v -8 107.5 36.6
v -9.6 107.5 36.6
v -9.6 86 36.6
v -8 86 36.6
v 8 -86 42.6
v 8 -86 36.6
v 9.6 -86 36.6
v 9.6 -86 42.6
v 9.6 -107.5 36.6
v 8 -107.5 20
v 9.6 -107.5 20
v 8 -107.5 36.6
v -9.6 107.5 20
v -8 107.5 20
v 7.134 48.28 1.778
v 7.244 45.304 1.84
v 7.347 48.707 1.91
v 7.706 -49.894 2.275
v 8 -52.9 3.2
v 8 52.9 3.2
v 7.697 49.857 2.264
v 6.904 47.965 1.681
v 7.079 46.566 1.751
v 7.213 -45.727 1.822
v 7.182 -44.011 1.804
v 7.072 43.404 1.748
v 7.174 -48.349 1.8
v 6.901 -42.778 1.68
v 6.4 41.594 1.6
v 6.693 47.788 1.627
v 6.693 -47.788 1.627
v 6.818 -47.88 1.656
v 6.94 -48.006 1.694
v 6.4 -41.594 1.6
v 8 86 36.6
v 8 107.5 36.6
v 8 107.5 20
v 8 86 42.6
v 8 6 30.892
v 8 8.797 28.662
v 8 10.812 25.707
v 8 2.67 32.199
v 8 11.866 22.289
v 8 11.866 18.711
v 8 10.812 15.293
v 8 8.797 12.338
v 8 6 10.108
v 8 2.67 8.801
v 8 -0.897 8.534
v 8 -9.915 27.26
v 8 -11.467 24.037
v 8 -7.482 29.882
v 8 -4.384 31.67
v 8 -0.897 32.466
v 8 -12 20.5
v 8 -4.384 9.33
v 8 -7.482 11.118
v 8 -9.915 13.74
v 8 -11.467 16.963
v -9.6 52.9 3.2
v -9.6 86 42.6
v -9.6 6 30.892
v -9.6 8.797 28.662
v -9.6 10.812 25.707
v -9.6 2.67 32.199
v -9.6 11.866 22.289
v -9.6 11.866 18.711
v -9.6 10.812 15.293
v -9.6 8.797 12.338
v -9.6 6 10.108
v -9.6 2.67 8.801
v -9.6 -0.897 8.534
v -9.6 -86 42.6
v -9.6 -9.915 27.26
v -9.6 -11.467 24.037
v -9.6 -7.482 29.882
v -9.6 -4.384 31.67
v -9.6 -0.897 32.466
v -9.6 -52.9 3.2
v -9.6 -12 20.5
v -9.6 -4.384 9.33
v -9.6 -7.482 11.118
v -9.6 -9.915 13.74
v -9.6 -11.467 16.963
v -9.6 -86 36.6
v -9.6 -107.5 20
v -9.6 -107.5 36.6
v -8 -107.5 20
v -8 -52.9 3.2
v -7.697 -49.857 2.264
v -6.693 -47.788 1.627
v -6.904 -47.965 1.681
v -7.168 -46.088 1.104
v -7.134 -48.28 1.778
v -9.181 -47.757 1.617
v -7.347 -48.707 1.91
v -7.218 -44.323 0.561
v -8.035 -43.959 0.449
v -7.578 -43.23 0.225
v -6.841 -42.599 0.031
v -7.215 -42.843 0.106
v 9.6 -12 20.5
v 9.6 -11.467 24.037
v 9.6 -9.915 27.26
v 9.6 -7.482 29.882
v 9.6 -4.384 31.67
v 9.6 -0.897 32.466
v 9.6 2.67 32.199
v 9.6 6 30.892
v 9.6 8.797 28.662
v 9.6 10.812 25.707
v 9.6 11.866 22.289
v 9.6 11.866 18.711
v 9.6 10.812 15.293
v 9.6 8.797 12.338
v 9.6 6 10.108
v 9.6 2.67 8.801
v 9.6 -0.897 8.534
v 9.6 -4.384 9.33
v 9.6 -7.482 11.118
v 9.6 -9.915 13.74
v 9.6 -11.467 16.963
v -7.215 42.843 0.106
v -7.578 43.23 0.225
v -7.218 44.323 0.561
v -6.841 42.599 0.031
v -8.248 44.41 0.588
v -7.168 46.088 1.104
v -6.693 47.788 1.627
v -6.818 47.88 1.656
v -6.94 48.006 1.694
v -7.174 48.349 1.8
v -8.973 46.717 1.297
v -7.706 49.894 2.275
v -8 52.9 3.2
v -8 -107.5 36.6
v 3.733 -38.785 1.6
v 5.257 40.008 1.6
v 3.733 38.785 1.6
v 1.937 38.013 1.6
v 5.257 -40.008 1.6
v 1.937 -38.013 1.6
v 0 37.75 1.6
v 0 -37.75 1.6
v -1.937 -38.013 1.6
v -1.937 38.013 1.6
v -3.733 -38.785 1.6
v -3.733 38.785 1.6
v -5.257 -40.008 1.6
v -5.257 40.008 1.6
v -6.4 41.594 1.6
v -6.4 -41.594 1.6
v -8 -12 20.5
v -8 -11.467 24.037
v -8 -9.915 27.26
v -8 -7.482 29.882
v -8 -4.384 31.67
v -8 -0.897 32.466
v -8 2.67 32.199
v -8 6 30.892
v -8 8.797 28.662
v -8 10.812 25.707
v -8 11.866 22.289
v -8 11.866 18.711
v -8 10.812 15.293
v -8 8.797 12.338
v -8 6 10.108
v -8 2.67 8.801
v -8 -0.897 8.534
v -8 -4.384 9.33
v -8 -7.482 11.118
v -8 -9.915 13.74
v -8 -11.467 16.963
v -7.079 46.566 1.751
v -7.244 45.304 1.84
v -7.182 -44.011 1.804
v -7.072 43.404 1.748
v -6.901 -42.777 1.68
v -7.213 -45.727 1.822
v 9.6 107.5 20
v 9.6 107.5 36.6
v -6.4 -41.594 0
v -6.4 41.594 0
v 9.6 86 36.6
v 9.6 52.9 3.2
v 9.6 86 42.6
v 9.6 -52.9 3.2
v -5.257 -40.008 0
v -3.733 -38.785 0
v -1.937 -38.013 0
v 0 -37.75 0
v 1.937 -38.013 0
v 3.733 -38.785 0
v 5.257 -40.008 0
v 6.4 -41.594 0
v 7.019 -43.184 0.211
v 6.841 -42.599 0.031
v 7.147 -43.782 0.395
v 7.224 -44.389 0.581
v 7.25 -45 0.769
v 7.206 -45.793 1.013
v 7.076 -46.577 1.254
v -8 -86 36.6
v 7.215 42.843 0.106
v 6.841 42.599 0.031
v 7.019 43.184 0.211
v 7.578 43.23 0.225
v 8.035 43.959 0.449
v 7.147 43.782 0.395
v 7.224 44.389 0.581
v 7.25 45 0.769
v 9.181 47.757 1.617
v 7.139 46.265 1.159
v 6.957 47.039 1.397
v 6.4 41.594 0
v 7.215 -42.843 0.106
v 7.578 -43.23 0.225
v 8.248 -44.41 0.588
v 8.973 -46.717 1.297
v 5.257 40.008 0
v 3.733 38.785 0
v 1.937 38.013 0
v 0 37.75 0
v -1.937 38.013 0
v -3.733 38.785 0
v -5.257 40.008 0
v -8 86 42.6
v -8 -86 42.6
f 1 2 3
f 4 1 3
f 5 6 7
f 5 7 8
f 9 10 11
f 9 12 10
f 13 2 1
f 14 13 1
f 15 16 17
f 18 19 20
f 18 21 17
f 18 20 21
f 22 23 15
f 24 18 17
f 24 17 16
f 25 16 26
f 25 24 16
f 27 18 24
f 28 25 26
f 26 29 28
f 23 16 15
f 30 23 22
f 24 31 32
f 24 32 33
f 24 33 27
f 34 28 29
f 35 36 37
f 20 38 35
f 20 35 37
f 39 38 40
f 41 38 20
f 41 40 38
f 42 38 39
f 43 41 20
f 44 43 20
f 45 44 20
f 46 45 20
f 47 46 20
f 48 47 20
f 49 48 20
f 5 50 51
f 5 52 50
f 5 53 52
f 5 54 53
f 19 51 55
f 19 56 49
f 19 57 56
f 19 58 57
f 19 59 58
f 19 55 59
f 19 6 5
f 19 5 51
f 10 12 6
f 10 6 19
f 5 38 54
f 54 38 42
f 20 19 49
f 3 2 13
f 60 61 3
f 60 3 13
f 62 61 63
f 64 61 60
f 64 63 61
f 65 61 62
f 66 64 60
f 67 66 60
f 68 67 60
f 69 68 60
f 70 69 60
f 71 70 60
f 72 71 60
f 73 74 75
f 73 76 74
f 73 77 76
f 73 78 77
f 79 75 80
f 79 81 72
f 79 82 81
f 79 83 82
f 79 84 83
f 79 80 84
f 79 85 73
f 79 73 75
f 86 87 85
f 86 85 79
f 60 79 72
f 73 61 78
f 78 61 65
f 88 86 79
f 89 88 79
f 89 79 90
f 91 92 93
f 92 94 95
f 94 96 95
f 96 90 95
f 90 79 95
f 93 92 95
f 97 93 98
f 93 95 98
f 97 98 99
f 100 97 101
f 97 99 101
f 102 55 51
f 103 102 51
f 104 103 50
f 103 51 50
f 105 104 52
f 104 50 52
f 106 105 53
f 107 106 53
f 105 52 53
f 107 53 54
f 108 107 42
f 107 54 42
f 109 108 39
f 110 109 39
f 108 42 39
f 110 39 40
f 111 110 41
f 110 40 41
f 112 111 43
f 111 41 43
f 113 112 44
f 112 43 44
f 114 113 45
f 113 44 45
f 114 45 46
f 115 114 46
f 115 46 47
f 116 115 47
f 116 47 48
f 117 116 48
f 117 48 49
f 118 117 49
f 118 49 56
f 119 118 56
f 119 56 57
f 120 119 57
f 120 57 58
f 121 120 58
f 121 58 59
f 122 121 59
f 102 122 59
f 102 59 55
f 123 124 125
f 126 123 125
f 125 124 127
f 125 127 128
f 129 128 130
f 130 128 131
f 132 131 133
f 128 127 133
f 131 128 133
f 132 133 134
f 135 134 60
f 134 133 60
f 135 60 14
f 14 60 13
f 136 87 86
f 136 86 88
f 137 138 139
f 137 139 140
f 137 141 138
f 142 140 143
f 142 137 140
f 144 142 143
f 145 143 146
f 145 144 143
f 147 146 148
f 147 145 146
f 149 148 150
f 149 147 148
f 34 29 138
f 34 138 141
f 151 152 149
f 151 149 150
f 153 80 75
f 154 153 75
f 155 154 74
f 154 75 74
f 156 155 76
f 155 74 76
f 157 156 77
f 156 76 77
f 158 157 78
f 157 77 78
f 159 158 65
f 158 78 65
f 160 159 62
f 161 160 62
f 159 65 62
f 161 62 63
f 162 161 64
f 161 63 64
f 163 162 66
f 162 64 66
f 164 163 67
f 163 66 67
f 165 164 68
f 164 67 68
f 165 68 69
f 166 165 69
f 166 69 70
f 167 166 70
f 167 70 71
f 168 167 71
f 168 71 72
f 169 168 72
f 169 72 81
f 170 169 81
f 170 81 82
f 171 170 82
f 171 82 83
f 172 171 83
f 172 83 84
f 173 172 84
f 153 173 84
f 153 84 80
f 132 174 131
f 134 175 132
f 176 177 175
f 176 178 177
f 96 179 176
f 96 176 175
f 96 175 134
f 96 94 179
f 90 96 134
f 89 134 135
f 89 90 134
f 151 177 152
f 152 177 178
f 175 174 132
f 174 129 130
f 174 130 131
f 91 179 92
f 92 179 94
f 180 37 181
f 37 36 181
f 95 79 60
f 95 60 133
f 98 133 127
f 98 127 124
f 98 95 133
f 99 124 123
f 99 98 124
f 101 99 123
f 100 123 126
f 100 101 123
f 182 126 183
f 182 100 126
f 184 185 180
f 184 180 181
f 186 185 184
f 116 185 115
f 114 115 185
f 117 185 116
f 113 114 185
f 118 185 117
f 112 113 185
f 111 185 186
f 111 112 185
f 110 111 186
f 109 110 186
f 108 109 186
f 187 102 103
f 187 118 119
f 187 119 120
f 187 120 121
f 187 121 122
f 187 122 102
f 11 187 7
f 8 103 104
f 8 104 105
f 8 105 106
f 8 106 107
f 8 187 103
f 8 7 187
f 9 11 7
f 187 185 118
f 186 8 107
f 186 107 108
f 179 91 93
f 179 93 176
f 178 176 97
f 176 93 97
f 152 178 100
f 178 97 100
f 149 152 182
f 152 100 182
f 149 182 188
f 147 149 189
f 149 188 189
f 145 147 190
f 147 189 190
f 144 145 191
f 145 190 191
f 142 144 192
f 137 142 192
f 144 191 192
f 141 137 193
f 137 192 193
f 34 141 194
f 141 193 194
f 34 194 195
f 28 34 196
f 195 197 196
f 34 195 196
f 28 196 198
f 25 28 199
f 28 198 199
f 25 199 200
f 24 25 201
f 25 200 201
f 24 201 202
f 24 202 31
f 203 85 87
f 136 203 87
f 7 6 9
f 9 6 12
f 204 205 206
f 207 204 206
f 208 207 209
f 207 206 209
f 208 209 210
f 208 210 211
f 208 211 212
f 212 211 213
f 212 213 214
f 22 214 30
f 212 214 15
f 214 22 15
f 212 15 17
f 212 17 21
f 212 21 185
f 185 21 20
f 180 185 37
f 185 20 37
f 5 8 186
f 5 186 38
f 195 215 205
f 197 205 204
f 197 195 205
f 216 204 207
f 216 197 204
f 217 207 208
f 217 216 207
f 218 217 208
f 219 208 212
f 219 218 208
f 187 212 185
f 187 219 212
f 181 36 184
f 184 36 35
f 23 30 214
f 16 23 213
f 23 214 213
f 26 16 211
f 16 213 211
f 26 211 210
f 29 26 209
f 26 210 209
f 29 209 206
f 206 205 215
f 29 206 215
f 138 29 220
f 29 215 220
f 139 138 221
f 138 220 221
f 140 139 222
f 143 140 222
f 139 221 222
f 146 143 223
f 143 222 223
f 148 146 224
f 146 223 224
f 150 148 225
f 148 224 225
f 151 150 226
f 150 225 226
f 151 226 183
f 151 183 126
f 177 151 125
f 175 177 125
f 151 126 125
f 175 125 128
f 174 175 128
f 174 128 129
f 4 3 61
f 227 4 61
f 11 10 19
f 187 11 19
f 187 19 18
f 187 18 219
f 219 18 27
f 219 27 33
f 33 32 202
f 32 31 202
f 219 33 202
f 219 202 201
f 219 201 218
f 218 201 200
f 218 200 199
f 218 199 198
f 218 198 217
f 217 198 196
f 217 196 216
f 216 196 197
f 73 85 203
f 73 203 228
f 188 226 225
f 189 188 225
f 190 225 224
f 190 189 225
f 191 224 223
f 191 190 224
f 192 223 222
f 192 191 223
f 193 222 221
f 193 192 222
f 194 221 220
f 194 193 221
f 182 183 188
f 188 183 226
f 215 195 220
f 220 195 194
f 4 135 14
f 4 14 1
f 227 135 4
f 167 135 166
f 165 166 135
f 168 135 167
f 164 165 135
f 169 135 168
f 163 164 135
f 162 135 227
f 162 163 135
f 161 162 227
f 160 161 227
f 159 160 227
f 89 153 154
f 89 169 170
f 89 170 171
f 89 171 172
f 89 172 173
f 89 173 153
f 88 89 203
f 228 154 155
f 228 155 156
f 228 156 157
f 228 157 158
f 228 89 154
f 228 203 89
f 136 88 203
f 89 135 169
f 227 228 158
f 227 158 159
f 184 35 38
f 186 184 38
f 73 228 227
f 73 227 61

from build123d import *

# Parameters (mm, degrees)
F1_DEPTH = 107.5
F2_W     = 21.5
F2_H     = 6
F2_R     = 12
F3_DEPTH = 25
F4_R     = 7.25
F5_DEPTH = 5


with BuildPart() as f1:
    # F0 (on Front) → F1 (new body, symmetric)
    with BuildSketch(Plane.XZ):
        with BuildLine():
            Line((-6.4, 0), (0, 0))
            Line((0, 0), (6.4, 0))
            ThreePointArc((6.4, 0), (8.662742, 0.937258), (9.6, 3.2))
            Line((9.6, 3.2), (9.6, 42.6))
            Line((9.6, 42.6), (8, 42.6))
            Line((8, 42.6), (8, 3.2))
            ThreePointArc((8, 3.2), (7.531371, 2.068629), (6.4, 1.6))
            Line((6.4, 1.6), (0, 1.6))
            Line((0, 1.6), (-6.4, 1.6))
            ThreePointArc((-6.4, 1.6), (-7.531371, 2.068629), (-8, 3.2))
            Line((-8, 3.2), (-8, 42.6))
            Line((-8, 42.6), (-9.6, 42.6))
            Line((-9.6, 42.6), (-9.6, 3.2))
            ThreePointArc((-9.6, 3.2), (-8.662742, 0.937258), (-6.4, 0))
        make_face()
    extrude(amount=F1_DEPTH, both=True)

    # F2 (on face) → F3 (cut)
    with BuildSketch(Plane(origin=(-9.6, 0, 0), x_dir=(0, -1, 0), z_dir=(-1, 0, 0))):
        with Locations((-96.75, 39.6)):
            Rectangle(F2_W, F2_H)
        Polygon((-42.5, 0), (-107.5, 20), (-107.5, 0), align=None)
        Polygon((42.5, 0), (107.5, 0), (107.5, 20), align=None)
        with Locations((96.75, 39.6)):
            Rectangle(F2_W, F2_H)
        with Locations((0, 20.5)):
            Circle(F2_R)
    extrude(amount=-F3_DEPTH, mode=Mode.SUBTRACT)

    # F4 (on face) → F5 (cut)
    with BuildSketch(Plane(origin=(0, 0, 0), x_dir=(1, 0, 0), z_dir=(0, 0, -1))):
        with Locations((0, -45)):
            Circle(F4_R)
        with Locations((0, 45)):
            Circle(F4_R)
    extrude(amount=-F5_DEPTH, mode=Mode.SUBTRACT)


solid = f1.part
